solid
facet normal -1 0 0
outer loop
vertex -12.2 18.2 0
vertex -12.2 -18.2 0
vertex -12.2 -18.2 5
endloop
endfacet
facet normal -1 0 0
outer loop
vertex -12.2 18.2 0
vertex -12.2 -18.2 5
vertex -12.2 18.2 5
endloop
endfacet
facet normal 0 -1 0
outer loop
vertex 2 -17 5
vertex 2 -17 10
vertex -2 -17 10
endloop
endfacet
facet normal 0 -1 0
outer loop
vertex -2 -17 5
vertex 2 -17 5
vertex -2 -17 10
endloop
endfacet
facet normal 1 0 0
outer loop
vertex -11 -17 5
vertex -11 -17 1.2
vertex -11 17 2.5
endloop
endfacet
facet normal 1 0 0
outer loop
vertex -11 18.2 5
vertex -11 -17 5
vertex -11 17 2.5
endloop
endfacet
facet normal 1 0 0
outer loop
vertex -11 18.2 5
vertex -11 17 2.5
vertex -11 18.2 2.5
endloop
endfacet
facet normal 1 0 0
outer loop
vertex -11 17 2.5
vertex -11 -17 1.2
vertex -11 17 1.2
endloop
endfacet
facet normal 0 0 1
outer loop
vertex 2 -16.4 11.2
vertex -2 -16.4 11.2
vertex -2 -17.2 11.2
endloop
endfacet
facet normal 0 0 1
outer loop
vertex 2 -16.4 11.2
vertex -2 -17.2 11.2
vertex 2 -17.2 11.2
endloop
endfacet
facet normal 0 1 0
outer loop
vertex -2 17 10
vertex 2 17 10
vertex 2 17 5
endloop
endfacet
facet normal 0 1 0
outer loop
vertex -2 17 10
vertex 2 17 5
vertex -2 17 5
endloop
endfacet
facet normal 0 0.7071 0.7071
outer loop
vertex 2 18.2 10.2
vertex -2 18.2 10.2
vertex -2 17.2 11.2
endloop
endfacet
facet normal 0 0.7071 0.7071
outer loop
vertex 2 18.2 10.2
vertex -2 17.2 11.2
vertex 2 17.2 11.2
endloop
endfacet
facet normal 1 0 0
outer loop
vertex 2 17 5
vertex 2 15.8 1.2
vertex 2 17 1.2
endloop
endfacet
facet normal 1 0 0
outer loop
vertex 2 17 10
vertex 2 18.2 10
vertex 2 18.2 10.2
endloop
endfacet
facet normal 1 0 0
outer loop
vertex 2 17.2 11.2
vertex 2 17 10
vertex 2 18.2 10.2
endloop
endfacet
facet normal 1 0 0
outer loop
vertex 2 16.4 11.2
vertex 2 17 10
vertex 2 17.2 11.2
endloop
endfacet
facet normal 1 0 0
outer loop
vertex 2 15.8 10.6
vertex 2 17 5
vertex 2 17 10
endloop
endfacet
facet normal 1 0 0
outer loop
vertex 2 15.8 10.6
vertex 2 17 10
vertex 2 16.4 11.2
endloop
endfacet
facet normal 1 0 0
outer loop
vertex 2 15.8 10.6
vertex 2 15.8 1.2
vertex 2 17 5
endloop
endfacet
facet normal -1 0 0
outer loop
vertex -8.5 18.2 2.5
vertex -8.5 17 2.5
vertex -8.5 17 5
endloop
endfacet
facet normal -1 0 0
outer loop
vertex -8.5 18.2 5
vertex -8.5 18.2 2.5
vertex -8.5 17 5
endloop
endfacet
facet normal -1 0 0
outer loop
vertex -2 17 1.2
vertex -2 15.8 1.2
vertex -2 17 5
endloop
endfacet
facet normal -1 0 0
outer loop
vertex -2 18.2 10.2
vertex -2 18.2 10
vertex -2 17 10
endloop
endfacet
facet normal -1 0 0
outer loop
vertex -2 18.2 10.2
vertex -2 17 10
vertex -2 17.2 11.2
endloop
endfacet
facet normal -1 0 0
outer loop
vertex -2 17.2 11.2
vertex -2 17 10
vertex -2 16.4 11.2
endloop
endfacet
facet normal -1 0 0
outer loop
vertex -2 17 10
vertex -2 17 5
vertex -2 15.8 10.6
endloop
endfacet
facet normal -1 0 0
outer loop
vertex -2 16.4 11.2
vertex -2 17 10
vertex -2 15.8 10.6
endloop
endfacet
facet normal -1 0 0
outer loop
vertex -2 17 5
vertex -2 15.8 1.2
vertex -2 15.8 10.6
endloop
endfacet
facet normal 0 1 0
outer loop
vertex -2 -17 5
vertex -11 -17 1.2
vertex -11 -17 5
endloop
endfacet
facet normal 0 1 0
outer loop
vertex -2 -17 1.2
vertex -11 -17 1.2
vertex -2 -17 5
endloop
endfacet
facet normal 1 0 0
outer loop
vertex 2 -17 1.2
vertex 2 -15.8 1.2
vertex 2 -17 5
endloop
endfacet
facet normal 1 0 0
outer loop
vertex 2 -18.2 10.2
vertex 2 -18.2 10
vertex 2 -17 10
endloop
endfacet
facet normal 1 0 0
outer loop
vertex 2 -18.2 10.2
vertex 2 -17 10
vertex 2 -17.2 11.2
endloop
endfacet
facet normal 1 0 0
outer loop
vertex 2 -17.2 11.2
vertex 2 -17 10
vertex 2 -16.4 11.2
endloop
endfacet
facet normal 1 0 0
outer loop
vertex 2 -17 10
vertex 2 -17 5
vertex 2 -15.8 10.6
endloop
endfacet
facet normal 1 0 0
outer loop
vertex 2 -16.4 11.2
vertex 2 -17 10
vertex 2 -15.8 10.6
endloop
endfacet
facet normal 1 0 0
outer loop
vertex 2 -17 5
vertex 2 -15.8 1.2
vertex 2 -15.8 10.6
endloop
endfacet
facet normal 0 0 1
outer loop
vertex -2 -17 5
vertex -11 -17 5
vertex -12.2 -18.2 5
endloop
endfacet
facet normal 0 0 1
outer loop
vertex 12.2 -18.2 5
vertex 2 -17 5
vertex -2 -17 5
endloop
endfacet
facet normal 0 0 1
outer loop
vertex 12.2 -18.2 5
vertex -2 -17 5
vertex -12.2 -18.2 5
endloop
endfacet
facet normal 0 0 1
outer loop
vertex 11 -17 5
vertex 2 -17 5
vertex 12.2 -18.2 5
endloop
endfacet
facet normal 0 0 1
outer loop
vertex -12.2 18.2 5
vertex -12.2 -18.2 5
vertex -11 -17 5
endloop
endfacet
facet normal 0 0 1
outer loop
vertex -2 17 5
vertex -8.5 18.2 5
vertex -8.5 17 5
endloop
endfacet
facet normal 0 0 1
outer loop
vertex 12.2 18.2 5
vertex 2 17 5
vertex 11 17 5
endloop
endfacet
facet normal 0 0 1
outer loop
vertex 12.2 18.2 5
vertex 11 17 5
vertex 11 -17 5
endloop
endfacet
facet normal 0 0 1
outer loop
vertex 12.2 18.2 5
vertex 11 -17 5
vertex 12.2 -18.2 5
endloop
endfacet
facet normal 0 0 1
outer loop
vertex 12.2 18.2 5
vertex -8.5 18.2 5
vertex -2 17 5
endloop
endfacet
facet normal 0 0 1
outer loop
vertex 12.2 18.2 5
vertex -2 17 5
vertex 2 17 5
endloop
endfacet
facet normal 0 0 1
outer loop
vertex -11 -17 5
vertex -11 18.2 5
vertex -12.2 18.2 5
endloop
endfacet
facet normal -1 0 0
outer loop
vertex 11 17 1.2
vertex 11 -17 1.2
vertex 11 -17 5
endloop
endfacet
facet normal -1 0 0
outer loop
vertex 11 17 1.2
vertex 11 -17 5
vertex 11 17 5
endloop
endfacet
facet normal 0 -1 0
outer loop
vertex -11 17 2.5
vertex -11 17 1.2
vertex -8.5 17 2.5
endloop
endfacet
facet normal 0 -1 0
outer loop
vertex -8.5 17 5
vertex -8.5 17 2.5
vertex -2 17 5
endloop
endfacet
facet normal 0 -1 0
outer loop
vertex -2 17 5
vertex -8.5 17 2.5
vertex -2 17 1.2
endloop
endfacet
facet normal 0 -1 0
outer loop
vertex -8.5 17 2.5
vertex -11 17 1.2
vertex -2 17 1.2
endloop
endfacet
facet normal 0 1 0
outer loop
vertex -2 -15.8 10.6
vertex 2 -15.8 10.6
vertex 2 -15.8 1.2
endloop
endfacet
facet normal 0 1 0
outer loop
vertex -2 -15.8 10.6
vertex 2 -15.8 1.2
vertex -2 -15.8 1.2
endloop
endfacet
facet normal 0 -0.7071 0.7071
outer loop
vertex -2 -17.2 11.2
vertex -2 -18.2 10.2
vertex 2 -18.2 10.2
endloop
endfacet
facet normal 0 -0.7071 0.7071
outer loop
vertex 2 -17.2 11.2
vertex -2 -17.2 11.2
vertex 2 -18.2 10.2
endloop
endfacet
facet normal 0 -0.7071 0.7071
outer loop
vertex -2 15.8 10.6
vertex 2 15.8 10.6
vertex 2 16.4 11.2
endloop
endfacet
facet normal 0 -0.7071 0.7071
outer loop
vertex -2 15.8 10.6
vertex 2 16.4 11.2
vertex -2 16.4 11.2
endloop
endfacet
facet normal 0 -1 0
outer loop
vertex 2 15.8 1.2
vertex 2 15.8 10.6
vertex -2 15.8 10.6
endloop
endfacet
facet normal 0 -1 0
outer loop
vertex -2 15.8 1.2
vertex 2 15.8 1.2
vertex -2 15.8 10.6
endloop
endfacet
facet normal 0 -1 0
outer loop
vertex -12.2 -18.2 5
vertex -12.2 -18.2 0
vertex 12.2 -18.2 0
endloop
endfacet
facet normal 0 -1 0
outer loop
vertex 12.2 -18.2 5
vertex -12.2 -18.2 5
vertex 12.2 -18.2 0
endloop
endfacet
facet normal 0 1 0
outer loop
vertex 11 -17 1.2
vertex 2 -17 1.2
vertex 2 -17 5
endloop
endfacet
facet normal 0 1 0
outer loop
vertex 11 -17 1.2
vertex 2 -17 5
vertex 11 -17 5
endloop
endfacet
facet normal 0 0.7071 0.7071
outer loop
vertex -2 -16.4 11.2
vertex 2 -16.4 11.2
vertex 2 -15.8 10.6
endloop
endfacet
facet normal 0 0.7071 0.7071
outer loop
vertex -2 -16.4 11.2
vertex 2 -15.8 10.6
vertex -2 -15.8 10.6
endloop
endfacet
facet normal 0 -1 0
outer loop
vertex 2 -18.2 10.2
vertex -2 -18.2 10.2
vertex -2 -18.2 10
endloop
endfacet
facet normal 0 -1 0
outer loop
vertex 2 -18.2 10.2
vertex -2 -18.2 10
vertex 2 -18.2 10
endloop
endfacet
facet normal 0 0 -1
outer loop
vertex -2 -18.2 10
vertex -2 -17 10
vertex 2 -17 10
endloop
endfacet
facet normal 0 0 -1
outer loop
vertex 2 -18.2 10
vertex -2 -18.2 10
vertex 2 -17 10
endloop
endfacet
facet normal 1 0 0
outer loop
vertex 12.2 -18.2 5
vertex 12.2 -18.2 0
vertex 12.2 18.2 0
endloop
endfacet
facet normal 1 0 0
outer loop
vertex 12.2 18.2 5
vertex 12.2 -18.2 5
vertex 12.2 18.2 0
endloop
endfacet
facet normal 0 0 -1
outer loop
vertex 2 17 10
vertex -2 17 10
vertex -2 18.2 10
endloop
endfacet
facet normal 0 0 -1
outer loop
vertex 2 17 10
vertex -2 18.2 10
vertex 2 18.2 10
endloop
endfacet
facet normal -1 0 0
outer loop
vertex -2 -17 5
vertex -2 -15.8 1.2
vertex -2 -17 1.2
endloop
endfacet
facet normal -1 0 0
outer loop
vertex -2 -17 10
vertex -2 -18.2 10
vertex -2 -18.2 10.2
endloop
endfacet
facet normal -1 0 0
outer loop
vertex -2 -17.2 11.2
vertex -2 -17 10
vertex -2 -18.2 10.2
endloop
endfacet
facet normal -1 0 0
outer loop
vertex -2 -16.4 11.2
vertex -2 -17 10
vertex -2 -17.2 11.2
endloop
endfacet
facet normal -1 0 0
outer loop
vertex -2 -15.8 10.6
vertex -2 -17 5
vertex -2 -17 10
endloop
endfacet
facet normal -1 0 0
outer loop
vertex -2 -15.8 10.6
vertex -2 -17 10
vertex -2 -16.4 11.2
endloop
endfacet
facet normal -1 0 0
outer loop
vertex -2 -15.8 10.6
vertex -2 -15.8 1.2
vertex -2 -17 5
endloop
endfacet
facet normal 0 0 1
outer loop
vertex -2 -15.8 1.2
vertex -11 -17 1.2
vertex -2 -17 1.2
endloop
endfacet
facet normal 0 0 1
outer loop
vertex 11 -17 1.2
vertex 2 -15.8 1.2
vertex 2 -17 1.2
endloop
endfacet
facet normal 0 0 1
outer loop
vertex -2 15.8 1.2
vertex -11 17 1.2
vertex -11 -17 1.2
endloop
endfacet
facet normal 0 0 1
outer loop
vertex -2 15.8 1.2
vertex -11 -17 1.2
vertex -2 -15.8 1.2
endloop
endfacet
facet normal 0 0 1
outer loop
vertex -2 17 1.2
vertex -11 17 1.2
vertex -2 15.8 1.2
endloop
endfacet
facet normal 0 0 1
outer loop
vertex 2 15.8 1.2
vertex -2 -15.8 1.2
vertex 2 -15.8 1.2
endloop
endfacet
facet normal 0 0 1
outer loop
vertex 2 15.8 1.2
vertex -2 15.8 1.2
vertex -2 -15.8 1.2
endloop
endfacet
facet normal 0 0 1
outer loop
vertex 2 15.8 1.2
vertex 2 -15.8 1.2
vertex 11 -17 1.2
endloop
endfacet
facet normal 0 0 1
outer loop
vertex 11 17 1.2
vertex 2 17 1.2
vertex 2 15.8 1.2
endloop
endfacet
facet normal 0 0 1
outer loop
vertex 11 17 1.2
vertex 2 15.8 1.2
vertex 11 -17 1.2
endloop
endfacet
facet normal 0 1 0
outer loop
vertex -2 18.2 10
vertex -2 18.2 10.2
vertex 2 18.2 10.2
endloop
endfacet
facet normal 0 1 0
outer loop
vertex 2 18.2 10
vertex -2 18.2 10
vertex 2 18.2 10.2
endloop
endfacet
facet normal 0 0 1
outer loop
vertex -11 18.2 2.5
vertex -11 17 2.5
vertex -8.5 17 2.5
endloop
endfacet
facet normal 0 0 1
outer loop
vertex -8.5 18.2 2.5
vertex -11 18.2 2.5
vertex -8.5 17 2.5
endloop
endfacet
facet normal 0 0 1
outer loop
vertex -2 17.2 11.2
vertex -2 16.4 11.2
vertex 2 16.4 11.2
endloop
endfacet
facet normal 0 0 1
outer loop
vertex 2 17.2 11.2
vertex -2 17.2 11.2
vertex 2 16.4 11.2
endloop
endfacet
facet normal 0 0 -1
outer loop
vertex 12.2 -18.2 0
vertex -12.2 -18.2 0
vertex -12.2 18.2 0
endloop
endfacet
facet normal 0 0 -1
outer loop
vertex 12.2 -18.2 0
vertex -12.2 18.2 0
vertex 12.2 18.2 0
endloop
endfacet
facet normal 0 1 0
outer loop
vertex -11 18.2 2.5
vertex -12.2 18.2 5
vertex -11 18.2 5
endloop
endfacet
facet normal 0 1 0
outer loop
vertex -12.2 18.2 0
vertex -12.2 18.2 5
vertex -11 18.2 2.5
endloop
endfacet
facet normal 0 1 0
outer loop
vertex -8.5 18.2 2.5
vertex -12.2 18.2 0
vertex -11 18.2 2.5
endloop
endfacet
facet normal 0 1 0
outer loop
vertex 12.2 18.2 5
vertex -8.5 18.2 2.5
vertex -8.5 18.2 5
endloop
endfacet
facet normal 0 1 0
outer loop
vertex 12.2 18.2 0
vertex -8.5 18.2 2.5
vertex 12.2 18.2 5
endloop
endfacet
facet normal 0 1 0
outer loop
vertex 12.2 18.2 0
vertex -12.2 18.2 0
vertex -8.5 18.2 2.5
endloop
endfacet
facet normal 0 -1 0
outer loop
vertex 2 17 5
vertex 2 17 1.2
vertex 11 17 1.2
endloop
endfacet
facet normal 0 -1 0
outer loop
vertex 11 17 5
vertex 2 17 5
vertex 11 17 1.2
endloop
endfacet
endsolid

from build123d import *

# Parameters (mm, degrees)
F0_W      = 22
F0_H      = 34
F1_DEPTH  = 1.2
F0_W_2    = 24.4
F0_H_2    = 36.4
F2_DEPTH  = 5
F3_W      = 4
F3_H      = 6.2
F3_H_2    = 3.8
F4_DEPTH  = 1.2
F5_SIZE   = 0.6
F6_W      = 4
F6_H      = 1.2
F7_DEPTH  = 1.2
F8_SIZE   = 1
F9_W      = 2.5
F9_H      = 2.5
F10_DEPTH = 25


# Not quite as in the source:
# - a pattern or mirror of a feature is missing from the dataset's text; its kind, count and spacing are read off the source's solid


with BuildPart() as f1:
    # F0 (on Top) → F1 (new body)
    with BuildSketch(Plane.XY):
        Rectangle(F0_W, F0_H)
    extrude(amount=F1_DEPTH)

    # F0 (on Top) → F2 (join)
    with BuildSketch(Plane.XY):
        Rectangle(F0_W_2, F0_H_2)
        Rectangle(F0_W, F0_H, mode=Mode.SUBTRACT)
    extrude(amount=F2_DEPTH)

    # F3 (on face) → F4 (join)
    with BuildSketch(Plane(origin=(0, -17, 0), x_dir=(-1, 0, 0), z_dir=(0, 1, 0))):
        with Locations((0, 8.1)):
            Rectangle(F3_W, F3_H)
        with Locations((0, 3.1)):
            Rectangle(F3_W, F3_H_2)
    f4 = extrude(amount=F4_DEPTH)

    # F4_copies: F4 across plane
    add(f4.mirror(Plane.ZX))

    # F5
    f5_edges = [f1.edges().sort_by_distance(p)[0] for p in [
        (0, -15.8, 11.2),
        (0, 15.8, 11.2),
    ]]
    chamfer(f5_edges, length=F5_SIZE)

    # F6 (on face) → F7 (join)
    with BuildSketch(Plane.XZ.offset(17)):
        with Locations((0, 10.6)):
            Rectangle(F6_W, F6_H)
    f7 = extrude(amount=F7_DEPTH)

    # F7_copies: F7 across plane
    add(f7.mirror(Plane.ZX))

    # F8
    f8_edges = [f1.edges().sort_by_distance(p)[0] for p in [
        (0, -18.2, 11.2),
        (0, 18.2, 11.2),
    ]]
    chamfer(f8_edges, length=F8_SIZE)

    # F9 (on face) → F10 (cut)
    with BuildSketch(Plane.XZ.offset(-17)):
        with Locations((-9.75, 3.75)):
            Rectangle(F9_W, F9_H)
    extrude(amount=-F10_DEPTH, mode=Mode.SUBTRACT)


solid = f1.part
